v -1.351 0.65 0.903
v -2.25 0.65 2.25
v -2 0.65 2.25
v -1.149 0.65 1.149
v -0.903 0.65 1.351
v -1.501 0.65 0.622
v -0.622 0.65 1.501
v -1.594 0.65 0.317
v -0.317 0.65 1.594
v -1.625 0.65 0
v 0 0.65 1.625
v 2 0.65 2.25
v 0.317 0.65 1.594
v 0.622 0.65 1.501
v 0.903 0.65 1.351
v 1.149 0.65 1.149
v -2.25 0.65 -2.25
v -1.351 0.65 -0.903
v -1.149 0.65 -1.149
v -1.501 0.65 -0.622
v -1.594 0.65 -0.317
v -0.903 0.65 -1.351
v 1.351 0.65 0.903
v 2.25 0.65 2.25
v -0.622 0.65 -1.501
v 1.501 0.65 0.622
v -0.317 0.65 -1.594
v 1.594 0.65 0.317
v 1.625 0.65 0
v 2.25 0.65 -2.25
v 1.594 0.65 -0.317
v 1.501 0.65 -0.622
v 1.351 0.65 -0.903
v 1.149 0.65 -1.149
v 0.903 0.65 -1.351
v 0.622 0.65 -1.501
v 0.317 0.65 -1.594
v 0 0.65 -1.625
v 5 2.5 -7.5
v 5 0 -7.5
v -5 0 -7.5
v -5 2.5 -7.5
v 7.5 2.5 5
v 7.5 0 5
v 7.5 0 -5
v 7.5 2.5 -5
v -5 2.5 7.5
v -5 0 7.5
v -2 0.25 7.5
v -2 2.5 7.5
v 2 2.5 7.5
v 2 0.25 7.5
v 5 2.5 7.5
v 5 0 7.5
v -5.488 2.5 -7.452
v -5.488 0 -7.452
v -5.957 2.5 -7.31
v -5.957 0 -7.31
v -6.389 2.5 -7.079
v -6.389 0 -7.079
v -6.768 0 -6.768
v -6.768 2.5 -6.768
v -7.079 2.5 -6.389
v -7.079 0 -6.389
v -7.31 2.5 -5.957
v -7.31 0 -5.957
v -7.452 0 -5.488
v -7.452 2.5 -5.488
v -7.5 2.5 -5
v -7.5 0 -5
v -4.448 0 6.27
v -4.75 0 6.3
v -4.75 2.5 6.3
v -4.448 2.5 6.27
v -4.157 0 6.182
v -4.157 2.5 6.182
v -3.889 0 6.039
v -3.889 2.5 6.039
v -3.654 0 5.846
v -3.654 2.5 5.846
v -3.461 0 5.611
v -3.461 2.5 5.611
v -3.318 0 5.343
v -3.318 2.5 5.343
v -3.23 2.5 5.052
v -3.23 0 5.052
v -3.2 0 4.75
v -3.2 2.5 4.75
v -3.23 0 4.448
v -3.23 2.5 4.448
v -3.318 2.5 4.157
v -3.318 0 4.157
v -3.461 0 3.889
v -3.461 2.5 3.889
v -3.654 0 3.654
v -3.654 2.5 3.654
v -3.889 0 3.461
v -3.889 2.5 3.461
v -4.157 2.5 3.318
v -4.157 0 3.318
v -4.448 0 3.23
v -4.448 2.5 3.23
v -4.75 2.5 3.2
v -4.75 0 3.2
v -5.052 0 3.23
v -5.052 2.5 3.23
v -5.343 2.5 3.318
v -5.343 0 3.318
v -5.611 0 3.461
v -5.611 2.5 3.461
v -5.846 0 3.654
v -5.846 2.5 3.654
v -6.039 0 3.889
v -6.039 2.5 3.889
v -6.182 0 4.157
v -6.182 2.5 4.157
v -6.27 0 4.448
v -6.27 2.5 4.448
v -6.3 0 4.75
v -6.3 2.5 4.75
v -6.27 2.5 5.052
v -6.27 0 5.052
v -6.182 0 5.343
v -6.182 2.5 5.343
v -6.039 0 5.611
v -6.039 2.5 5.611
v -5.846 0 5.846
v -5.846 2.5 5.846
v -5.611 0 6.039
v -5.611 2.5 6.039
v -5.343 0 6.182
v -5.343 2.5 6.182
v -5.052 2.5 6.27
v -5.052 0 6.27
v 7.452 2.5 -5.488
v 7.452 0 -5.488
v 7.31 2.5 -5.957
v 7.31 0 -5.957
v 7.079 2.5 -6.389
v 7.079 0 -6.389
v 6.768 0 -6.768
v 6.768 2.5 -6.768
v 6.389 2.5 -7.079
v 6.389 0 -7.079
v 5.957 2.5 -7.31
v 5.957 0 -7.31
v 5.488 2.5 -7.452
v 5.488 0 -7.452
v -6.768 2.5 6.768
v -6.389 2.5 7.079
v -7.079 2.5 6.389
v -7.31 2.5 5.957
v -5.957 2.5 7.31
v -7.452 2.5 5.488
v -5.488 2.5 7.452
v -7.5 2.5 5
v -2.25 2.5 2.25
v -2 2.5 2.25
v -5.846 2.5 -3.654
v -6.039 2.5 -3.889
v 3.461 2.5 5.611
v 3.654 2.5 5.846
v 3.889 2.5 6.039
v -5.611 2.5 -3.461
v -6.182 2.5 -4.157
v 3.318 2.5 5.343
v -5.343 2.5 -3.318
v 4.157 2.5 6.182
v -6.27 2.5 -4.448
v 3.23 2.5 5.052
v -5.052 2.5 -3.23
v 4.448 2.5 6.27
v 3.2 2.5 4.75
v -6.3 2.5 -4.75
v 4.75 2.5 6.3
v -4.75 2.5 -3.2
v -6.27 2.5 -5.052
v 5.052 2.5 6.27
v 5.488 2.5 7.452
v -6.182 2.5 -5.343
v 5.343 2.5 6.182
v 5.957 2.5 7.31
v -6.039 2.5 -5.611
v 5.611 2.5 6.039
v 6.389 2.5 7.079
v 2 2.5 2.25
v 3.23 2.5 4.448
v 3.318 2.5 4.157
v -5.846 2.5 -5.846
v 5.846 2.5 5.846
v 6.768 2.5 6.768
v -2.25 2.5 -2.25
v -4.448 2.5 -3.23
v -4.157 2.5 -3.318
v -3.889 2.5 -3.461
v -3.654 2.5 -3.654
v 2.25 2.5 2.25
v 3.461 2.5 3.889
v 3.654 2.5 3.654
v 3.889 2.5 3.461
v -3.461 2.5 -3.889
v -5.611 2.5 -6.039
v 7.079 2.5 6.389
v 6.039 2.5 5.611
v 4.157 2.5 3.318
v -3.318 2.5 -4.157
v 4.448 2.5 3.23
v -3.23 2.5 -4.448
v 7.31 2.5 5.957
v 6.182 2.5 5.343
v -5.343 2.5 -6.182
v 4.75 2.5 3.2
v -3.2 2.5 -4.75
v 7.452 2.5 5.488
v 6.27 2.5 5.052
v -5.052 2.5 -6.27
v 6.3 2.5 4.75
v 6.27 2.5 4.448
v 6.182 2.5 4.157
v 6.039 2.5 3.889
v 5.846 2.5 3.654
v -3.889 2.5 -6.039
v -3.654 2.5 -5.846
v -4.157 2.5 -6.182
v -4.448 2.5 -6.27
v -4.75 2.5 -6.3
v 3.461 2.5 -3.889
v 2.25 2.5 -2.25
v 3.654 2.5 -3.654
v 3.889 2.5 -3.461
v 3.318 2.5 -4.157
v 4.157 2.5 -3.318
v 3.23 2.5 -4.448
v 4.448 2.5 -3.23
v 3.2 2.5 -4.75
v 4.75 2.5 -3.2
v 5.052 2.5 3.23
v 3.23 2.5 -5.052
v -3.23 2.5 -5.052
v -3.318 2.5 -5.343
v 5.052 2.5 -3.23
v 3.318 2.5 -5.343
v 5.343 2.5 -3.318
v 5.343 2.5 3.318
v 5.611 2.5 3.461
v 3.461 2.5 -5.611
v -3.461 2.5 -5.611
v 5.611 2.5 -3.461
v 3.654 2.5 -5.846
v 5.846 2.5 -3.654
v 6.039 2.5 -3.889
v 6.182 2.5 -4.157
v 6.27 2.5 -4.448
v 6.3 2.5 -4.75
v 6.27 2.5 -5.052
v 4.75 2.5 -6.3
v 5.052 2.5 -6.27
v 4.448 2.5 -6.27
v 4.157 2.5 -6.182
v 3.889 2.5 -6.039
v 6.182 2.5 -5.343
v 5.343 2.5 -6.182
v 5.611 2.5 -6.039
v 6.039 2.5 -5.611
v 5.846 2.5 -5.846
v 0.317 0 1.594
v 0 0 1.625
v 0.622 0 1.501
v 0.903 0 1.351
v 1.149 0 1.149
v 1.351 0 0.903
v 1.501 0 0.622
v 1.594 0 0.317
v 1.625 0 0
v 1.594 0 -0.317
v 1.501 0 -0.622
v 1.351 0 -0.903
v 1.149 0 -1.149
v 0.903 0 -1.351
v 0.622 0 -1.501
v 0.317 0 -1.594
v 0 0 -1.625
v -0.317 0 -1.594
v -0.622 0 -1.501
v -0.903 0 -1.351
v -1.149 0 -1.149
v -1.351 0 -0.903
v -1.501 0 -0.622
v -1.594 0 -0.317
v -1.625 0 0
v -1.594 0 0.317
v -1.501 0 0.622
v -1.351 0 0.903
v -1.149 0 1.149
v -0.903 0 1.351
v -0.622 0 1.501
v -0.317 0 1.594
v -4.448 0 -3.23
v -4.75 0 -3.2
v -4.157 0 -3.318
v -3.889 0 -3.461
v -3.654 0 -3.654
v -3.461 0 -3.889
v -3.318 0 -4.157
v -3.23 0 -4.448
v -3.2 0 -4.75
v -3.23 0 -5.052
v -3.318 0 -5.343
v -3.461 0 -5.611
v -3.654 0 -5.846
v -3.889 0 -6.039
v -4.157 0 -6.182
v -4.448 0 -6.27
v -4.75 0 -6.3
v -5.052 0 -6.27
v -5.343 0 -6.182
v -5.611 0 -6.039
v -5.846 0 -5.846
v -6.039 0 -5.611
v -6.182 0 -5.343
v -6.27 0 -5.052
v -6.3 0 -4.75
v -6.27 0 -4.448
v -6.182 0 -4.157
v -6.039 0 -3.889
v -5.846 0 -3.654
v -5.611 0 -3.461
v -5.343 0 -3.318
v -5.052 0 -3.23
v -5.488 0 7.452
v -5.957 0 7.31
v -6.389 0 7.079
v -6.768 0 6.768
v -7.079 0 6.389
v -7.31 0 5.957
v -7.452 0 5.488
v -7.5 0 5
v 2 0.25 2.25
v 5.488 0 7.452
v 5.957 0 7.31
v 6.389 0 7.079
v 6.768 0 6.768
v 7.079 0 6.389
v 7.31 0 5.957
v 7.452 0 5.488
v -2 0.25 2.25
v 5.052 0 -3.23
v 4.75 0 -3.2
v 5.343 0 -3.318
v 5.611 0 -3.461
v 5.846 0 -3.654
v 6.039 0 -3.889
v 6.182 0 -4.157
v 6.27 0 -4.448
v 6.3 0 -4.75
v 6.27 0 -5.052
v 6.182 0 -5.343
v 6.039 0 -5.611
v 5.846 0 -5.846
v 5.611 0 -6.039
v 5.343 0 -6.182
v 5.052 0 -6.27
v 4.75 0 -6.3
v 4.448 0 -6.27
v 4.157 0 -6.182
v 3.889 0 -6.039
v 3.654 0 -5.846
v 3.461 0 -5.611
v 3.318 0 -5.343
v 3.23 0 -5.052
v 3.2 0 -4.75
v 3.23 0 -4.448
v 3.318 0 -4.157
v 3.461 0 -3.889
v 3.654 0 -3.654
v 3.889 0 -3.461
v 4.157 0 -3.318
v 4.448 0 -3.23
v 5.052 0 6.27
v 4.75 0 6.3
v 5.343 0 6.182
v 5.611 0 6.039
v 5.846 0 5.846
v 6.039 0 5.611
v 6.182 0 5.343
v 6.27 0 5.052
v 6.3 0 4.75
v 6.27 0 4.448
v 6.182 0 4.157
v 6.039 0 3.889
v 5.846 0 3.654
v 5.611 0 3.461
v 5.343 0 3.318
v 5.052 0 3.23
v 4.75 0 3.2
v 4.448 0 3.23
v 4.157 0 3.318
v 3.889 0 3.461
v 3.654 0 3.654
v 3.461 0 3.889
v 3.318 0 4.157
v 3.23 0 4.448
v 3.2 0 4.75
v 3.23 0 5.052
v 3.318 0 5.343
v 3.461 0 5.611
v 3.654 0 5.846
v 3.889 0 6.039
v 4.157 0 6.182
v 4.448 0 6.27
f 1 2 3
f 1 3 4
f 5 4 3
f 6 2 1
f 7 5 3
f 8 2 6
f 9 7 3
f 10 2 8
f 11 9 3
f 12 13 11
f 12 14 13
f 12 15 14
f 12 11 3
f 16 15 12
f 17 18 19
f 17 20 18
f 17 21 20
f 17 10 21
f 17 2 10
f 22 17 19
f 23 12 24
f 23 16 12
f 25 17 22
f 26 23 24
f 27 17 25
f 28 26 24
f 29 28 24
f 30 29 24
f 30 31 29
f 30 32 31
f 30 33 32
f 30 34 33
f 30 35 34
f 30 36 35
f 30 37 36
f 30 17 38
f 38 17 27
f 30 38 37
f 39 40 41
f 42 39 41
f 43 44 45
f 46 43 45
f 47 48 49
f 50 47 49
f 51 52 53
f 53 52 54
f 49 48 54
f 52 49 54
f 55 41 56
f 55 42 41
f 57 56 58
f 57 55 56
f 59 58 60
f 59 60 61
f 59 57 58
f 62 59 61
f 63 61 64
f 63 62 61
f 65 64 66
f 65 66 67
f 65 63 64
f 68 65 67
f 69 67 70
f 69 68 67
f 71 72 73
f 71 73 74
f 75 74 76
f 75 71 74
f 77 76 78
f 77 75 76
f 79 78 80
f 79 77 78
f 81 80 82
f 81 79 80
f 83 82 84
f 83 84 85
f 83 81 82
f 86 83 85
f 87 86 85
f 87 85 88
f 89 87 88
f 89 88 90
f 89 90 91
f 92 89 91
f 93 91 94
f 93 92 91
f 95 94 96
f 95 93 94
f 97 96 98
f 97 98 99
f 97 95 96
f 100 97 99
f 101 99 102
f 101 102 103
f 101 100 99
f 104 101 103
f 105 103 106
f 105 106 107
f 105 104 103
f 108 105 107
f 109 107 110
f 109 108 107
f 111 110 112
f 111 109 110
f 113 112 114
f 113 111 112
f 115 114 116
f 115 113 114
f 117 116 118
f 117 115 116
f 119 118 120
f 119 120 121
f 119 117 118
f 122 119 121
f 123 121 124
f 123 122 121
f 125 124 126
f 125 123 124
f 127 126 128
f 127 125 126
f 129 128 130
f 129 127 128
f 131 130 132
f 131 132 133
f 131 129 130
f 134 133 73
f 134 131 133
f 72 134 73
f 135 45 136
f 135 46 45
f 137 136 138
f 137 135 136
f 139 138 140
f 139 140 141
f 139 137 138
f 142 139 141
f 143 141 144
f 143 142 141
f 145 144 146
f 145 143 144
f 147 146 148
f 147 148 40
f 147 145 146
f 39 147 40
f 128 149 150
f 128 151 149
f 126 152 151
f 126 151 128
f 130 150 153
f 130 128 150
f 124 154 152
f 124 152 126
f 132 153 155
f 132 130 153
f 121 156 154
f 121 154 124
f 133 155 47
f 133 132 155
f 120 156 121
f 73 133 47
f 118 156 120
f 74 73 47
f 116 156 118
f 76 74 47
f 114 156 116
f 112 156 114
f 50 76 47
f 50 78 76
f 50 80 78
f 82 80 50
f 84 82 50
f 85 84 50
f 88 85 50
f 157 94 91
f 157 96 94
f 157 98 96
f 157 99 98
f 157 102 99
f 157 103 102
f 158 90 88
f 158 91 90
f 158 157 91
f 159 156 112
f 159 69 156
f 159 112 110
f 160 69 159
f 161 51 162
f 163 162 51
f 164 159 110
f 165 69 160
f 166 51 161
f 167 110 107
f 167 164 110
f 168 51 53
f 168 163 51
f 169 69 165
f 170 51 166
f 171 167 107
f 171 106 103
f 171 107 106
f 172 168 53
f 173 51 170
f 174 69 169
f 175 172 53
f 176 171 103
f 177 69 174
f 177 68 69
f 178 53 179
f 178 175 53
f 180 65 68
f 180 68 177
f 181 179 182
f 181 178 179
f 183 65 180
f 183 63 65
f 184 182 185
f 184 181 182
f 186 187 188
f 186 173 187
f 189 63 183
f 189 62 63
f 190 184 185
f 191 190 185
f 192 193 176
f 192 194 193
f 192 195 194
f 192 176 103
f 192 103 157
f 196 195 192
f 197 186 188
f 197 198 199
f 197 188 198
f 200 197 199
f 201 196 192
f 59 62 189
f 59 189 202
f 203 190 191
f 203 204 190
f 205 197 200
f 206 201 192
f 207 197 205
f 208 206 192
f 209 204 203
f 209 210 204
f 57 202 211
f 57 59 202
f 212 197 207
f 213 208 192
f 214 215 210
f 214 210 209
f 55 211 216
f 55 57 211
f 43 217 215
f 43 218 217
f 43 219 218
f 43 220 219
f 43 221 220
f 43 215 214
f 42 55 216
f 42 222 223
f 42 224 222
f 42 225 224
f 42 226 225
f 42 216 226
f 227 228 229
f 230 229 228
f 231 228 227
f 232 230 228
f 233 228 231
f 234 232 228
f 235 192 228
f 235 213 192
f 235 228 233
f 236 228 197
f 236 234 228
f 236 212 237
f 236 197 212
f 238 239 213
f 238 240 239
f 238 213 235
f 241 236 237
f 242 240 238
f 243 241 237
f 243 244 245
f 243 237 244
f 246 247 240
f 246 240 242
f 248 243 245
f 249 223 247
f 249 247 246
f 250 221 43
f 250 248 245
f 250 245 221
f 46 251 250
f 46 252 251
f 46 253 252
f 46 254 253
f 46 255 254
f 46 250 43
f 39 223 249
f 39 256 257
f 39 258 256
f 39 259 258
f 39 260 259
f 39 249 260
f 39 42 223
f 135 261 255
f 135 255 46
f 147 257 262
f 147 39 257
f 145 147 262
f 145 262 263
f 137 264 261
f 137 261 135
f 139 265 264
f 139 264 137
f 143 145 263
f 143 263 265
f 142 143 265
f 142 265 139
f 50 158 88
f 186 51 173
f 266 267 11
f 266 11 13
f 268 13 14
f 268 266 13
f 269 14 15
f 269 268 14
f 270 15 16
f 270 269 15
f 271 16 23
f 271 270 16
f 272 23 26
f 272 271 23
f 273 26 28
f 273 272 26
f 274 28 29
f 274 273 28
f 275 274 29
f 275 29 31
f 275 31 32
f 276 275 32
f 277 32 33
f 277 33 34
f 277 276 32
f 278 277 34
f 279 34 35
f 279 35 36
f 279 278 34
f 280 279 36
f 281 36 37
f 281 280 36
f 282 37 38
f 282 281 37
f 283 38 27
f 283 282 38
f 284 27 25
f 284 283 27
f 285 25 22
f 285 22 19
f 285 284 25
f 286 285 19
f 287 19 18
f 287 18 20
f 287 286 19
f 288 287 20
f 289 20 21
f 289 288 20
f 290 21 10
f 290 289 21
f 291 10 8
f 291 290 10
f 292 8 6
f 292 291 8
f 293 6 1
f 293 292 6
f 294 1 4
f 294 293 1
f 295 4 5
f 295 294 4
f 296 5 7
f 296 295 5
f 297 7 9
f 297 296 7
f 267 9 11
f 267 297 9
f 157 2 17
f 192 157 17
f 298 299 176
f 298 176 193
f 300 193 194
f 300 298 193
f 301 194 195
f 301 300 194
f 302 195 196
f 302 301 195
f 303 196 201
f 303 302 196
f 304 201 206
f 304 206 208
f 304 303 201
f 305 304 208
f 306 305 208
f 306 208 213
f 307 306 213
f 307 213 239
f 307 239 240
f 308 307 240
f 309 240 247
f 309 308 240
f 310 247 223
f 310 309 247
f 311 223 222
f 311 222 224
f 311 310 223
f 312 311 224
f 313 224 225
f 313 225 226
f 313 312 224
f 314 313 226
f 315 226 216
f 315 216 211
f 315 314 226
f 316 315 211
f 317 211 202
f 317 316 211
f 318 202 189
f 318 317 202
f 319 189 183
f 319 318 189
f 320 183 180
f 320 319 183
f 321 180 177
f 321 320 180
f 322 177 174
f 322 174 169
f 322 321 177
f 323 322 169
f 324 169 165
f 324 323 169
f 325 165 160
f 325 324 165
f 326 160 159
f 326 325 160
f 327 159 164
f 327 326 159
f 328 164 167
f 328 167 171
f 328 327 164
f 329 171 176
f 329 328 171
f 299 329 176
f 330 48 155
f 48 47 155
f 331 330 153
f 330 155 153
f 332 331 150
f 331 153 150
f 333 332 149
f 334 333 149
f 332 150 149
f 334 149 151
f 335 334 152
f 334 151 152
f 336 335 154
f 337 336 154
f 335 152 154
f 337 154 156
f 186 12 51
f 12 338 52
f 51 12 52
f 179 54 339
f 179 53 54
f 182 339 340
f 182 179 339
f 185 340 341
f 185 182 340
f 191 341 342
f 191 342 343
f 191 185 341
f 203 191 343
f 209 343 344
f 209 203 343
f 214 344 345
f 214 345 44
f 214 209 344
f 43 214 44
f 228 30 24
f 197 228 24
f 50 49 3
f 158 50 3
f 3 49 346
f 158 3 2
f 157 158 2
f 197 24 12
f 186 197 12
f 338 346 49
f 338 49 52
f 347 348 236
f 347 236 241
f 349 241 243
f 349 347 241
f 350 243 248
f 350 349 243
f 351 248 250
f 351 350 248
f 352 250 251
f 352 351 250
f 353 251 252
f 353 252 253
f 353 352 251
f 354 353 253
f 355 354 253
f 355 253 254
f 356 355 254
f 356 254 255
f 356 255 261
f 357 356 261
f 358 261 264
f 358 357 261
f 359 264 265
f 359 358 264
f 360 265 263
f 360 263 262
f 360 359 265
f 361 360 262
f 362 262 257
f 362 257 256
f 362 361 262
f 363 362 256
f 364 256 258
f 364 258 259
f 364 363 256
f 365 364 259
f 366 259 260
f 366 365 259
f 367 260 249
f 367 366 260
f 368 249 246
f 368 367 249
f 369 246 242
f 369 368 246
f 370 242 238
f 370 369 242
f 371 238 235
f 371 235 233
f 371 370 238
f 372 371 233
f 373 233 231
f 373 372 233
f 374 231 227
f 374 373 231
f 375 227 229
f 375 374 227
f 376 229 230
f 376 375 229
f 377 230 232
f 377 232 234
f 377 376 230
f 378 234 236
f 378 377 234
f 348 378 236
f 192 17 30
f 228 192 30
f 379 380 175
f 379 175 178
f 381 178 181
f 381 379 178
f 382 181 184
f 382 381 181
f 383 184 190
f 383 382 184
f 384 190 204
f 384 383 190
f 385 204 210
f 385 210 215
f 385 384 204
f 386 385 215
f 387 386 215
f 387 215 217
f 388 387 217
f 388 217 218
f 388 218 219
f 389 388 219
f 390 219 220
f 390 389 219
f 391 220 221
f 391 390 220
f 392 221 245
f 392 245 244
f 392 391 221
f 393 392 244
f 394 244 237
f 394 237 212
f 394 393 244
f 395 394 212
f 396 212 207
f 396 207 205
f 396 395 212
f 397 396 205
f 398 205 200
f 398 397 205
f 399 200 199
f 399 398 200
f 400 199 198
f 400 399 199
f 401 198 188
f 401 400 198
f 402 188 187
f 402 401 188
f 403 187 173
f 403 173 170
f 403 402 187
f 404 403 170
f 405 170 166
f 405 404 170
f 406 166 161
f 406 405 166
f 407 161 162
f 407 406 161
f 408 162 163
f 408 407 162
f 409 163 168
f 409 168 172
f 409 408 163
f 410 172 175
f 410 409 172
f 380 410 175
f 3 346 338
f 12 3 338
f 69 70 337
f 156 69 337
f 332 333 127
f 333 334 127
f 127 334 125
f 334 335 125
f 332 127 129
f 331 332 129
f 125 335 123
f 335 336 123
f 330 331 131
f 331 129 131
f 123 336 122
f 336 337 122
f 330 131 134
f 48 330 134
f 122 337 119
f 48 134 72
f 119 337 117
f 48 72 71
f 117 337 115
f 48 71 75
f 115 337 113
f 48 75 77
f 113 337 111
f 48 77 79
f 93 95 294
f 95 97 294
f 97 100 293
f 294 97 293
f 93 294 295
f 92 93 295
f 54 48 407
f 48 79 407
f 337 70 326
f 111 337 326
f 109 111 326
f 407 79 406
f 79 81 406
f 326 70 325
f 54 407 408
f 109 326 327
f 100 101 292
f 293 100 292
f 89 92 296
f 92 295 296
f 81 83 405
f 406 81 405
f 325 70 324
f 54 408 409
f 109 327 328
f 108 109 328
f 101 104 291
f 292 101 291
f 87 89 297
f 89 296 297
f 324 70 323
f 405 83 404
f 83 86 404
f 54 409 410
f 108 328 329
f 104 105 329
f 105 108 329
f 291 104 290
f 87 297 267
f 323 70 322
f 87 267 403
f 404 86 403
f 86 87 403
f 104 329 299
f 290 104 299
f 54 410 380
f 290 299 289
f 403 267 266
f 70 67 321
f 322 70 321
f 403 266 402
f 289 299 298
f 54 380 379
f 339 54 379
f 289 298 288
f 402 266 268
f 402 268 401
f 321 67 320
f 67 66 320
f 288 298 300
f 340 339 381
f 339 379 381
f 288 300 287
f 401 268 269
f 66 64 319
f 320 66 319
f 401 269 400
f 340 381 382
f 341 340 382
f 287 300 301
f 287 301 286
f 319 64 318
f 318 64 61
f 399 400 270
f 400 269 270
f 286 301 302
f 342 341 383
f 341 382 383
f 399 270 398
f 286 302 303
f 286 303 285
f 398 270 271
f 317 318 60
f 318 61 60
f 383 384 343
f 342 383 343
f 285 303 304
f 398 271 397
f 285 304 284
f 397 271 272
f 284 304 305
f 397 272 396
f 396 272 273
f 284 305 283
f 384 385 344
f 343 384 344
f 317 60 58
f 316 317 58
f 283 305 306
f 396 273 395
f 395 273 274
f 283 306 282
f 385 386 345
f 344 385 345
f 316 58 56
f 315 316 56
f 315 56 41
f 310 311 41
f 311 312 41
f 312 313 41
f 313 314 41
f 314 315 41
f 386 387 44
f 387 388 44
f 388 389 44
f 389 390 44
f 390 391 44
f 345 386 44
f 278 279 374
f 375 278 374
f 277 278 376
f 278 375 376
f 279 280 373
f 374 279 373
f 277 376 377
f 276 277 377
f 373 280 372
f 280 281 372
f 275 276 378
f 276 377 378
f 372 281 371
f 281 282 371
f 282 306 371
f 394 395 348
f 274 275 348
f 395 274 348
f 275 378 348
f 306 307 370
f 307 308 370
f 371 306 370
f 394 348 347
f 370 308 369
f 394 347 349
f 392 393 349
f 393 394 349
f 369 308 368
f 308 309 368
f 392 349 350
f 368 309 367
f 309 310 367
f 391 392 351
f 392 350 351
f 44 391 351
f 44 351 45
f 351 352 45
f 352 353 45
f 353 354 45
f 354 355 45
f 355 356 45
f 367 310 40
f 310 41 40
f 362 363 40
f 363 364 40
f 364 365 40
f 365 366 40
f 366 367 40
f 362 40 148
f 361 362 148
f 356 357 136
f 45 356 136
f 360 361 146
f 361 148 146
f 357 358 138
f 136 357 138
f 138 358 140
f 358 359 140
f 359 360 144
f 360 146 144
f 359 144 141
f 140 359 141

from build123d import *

# Parameters (mm, degrees)
BASE_R              = 1.55
BOSS_EXTRUDE1_DEPTH = 2.5
SKETCH1_3_R         = 1.625
BOSS_EXTRUDE2_DEPTH = 0.65
SKETCH1_4_W         = 4
SKETCH1_4_H         = 5.25
BOSS_EXTRUDE3_DEPTH = 0.25
FILLET1_R           = 2.5


with BuildPart() as part:
    # Base → Boss-Extrude1 (new body)
    with BuildSketch(Plane(origin=(0, 0, 0), x_dir=(1, 0, 0), z_dir=(0, 1, 0))):
        Polygon((-7.5, -7.5), (-2, -7.5), (-2, -2.25), (-2.25, -2.25), (-2.25, 2.25), (2.25, 2.25), (2.25, -2.25), (2, -2.25), (2, -7.5), (7.5, -7.5), (7.5, 7.5), (-7.5, 7.5), align=None)
        with Locations((-4.75, -4.75)):
            Circle(BASE_R, mode=Mode.SUBTRACT)
        with Locations((4.75, -4.75)):
            Circle(BASE_R, mode=Mode.SUBTRACT)
        with Locations((-4.75, 4.75)):
            Circle(BASE_R, mode=Mode.SUBTRACT)
        with Locations((4.75, 4.75)):
            Circle(BASE_R, mode=Mode.SUBTRACT)
    extrude(amount=BOSS_EXTRUDE1_DEPTH)

    # Sketch1<3> → Boss-Extrude2 (add)
    with BuildSketch(Plane(origin=(0, 0, 0), x_dir=(1, 0, 0), z_dir=(0, 1, 0))):
        Polygon((-2.25, -2.25), (-2, -2.25), (2, -2.25), (2.25, -2.25), (2.25, 2.25), (-2.25, 2.25), align=None)
        Circle(SKETCH1_3_R, mode=Mode.SUBTRACT)
    extrude(amount=BOSS_EXTRUDE2_DEPTH)

    # Sketch1<4> → Boss-Extrude3 (add)
    with BuildSketch(Plane(origin=(0, 0, 0), x_dir=(1, 0, 0), z_dir=(0, 1, 0))):
        with Locations((0, -4.875)):
            Rectangle(SKETCH1_4_W, SKETCH1_4_H)
    extrude(amount=BOSS_EXTRUDE3_DEPTH)

    # Fillet1
    fillet1_edges = [part.edges().sort_by_distance(p)[0] for p in [
        (-7.5, 1.25, 7.5),
        (-7.5, 1.25, -7.5),
        (7.5, 1.25, -7.5),
        (7.5, 1.25, 7.5),
    ]]
    fillet(fillet1_edges, radius=FILLET1_R)


solid = part.part
